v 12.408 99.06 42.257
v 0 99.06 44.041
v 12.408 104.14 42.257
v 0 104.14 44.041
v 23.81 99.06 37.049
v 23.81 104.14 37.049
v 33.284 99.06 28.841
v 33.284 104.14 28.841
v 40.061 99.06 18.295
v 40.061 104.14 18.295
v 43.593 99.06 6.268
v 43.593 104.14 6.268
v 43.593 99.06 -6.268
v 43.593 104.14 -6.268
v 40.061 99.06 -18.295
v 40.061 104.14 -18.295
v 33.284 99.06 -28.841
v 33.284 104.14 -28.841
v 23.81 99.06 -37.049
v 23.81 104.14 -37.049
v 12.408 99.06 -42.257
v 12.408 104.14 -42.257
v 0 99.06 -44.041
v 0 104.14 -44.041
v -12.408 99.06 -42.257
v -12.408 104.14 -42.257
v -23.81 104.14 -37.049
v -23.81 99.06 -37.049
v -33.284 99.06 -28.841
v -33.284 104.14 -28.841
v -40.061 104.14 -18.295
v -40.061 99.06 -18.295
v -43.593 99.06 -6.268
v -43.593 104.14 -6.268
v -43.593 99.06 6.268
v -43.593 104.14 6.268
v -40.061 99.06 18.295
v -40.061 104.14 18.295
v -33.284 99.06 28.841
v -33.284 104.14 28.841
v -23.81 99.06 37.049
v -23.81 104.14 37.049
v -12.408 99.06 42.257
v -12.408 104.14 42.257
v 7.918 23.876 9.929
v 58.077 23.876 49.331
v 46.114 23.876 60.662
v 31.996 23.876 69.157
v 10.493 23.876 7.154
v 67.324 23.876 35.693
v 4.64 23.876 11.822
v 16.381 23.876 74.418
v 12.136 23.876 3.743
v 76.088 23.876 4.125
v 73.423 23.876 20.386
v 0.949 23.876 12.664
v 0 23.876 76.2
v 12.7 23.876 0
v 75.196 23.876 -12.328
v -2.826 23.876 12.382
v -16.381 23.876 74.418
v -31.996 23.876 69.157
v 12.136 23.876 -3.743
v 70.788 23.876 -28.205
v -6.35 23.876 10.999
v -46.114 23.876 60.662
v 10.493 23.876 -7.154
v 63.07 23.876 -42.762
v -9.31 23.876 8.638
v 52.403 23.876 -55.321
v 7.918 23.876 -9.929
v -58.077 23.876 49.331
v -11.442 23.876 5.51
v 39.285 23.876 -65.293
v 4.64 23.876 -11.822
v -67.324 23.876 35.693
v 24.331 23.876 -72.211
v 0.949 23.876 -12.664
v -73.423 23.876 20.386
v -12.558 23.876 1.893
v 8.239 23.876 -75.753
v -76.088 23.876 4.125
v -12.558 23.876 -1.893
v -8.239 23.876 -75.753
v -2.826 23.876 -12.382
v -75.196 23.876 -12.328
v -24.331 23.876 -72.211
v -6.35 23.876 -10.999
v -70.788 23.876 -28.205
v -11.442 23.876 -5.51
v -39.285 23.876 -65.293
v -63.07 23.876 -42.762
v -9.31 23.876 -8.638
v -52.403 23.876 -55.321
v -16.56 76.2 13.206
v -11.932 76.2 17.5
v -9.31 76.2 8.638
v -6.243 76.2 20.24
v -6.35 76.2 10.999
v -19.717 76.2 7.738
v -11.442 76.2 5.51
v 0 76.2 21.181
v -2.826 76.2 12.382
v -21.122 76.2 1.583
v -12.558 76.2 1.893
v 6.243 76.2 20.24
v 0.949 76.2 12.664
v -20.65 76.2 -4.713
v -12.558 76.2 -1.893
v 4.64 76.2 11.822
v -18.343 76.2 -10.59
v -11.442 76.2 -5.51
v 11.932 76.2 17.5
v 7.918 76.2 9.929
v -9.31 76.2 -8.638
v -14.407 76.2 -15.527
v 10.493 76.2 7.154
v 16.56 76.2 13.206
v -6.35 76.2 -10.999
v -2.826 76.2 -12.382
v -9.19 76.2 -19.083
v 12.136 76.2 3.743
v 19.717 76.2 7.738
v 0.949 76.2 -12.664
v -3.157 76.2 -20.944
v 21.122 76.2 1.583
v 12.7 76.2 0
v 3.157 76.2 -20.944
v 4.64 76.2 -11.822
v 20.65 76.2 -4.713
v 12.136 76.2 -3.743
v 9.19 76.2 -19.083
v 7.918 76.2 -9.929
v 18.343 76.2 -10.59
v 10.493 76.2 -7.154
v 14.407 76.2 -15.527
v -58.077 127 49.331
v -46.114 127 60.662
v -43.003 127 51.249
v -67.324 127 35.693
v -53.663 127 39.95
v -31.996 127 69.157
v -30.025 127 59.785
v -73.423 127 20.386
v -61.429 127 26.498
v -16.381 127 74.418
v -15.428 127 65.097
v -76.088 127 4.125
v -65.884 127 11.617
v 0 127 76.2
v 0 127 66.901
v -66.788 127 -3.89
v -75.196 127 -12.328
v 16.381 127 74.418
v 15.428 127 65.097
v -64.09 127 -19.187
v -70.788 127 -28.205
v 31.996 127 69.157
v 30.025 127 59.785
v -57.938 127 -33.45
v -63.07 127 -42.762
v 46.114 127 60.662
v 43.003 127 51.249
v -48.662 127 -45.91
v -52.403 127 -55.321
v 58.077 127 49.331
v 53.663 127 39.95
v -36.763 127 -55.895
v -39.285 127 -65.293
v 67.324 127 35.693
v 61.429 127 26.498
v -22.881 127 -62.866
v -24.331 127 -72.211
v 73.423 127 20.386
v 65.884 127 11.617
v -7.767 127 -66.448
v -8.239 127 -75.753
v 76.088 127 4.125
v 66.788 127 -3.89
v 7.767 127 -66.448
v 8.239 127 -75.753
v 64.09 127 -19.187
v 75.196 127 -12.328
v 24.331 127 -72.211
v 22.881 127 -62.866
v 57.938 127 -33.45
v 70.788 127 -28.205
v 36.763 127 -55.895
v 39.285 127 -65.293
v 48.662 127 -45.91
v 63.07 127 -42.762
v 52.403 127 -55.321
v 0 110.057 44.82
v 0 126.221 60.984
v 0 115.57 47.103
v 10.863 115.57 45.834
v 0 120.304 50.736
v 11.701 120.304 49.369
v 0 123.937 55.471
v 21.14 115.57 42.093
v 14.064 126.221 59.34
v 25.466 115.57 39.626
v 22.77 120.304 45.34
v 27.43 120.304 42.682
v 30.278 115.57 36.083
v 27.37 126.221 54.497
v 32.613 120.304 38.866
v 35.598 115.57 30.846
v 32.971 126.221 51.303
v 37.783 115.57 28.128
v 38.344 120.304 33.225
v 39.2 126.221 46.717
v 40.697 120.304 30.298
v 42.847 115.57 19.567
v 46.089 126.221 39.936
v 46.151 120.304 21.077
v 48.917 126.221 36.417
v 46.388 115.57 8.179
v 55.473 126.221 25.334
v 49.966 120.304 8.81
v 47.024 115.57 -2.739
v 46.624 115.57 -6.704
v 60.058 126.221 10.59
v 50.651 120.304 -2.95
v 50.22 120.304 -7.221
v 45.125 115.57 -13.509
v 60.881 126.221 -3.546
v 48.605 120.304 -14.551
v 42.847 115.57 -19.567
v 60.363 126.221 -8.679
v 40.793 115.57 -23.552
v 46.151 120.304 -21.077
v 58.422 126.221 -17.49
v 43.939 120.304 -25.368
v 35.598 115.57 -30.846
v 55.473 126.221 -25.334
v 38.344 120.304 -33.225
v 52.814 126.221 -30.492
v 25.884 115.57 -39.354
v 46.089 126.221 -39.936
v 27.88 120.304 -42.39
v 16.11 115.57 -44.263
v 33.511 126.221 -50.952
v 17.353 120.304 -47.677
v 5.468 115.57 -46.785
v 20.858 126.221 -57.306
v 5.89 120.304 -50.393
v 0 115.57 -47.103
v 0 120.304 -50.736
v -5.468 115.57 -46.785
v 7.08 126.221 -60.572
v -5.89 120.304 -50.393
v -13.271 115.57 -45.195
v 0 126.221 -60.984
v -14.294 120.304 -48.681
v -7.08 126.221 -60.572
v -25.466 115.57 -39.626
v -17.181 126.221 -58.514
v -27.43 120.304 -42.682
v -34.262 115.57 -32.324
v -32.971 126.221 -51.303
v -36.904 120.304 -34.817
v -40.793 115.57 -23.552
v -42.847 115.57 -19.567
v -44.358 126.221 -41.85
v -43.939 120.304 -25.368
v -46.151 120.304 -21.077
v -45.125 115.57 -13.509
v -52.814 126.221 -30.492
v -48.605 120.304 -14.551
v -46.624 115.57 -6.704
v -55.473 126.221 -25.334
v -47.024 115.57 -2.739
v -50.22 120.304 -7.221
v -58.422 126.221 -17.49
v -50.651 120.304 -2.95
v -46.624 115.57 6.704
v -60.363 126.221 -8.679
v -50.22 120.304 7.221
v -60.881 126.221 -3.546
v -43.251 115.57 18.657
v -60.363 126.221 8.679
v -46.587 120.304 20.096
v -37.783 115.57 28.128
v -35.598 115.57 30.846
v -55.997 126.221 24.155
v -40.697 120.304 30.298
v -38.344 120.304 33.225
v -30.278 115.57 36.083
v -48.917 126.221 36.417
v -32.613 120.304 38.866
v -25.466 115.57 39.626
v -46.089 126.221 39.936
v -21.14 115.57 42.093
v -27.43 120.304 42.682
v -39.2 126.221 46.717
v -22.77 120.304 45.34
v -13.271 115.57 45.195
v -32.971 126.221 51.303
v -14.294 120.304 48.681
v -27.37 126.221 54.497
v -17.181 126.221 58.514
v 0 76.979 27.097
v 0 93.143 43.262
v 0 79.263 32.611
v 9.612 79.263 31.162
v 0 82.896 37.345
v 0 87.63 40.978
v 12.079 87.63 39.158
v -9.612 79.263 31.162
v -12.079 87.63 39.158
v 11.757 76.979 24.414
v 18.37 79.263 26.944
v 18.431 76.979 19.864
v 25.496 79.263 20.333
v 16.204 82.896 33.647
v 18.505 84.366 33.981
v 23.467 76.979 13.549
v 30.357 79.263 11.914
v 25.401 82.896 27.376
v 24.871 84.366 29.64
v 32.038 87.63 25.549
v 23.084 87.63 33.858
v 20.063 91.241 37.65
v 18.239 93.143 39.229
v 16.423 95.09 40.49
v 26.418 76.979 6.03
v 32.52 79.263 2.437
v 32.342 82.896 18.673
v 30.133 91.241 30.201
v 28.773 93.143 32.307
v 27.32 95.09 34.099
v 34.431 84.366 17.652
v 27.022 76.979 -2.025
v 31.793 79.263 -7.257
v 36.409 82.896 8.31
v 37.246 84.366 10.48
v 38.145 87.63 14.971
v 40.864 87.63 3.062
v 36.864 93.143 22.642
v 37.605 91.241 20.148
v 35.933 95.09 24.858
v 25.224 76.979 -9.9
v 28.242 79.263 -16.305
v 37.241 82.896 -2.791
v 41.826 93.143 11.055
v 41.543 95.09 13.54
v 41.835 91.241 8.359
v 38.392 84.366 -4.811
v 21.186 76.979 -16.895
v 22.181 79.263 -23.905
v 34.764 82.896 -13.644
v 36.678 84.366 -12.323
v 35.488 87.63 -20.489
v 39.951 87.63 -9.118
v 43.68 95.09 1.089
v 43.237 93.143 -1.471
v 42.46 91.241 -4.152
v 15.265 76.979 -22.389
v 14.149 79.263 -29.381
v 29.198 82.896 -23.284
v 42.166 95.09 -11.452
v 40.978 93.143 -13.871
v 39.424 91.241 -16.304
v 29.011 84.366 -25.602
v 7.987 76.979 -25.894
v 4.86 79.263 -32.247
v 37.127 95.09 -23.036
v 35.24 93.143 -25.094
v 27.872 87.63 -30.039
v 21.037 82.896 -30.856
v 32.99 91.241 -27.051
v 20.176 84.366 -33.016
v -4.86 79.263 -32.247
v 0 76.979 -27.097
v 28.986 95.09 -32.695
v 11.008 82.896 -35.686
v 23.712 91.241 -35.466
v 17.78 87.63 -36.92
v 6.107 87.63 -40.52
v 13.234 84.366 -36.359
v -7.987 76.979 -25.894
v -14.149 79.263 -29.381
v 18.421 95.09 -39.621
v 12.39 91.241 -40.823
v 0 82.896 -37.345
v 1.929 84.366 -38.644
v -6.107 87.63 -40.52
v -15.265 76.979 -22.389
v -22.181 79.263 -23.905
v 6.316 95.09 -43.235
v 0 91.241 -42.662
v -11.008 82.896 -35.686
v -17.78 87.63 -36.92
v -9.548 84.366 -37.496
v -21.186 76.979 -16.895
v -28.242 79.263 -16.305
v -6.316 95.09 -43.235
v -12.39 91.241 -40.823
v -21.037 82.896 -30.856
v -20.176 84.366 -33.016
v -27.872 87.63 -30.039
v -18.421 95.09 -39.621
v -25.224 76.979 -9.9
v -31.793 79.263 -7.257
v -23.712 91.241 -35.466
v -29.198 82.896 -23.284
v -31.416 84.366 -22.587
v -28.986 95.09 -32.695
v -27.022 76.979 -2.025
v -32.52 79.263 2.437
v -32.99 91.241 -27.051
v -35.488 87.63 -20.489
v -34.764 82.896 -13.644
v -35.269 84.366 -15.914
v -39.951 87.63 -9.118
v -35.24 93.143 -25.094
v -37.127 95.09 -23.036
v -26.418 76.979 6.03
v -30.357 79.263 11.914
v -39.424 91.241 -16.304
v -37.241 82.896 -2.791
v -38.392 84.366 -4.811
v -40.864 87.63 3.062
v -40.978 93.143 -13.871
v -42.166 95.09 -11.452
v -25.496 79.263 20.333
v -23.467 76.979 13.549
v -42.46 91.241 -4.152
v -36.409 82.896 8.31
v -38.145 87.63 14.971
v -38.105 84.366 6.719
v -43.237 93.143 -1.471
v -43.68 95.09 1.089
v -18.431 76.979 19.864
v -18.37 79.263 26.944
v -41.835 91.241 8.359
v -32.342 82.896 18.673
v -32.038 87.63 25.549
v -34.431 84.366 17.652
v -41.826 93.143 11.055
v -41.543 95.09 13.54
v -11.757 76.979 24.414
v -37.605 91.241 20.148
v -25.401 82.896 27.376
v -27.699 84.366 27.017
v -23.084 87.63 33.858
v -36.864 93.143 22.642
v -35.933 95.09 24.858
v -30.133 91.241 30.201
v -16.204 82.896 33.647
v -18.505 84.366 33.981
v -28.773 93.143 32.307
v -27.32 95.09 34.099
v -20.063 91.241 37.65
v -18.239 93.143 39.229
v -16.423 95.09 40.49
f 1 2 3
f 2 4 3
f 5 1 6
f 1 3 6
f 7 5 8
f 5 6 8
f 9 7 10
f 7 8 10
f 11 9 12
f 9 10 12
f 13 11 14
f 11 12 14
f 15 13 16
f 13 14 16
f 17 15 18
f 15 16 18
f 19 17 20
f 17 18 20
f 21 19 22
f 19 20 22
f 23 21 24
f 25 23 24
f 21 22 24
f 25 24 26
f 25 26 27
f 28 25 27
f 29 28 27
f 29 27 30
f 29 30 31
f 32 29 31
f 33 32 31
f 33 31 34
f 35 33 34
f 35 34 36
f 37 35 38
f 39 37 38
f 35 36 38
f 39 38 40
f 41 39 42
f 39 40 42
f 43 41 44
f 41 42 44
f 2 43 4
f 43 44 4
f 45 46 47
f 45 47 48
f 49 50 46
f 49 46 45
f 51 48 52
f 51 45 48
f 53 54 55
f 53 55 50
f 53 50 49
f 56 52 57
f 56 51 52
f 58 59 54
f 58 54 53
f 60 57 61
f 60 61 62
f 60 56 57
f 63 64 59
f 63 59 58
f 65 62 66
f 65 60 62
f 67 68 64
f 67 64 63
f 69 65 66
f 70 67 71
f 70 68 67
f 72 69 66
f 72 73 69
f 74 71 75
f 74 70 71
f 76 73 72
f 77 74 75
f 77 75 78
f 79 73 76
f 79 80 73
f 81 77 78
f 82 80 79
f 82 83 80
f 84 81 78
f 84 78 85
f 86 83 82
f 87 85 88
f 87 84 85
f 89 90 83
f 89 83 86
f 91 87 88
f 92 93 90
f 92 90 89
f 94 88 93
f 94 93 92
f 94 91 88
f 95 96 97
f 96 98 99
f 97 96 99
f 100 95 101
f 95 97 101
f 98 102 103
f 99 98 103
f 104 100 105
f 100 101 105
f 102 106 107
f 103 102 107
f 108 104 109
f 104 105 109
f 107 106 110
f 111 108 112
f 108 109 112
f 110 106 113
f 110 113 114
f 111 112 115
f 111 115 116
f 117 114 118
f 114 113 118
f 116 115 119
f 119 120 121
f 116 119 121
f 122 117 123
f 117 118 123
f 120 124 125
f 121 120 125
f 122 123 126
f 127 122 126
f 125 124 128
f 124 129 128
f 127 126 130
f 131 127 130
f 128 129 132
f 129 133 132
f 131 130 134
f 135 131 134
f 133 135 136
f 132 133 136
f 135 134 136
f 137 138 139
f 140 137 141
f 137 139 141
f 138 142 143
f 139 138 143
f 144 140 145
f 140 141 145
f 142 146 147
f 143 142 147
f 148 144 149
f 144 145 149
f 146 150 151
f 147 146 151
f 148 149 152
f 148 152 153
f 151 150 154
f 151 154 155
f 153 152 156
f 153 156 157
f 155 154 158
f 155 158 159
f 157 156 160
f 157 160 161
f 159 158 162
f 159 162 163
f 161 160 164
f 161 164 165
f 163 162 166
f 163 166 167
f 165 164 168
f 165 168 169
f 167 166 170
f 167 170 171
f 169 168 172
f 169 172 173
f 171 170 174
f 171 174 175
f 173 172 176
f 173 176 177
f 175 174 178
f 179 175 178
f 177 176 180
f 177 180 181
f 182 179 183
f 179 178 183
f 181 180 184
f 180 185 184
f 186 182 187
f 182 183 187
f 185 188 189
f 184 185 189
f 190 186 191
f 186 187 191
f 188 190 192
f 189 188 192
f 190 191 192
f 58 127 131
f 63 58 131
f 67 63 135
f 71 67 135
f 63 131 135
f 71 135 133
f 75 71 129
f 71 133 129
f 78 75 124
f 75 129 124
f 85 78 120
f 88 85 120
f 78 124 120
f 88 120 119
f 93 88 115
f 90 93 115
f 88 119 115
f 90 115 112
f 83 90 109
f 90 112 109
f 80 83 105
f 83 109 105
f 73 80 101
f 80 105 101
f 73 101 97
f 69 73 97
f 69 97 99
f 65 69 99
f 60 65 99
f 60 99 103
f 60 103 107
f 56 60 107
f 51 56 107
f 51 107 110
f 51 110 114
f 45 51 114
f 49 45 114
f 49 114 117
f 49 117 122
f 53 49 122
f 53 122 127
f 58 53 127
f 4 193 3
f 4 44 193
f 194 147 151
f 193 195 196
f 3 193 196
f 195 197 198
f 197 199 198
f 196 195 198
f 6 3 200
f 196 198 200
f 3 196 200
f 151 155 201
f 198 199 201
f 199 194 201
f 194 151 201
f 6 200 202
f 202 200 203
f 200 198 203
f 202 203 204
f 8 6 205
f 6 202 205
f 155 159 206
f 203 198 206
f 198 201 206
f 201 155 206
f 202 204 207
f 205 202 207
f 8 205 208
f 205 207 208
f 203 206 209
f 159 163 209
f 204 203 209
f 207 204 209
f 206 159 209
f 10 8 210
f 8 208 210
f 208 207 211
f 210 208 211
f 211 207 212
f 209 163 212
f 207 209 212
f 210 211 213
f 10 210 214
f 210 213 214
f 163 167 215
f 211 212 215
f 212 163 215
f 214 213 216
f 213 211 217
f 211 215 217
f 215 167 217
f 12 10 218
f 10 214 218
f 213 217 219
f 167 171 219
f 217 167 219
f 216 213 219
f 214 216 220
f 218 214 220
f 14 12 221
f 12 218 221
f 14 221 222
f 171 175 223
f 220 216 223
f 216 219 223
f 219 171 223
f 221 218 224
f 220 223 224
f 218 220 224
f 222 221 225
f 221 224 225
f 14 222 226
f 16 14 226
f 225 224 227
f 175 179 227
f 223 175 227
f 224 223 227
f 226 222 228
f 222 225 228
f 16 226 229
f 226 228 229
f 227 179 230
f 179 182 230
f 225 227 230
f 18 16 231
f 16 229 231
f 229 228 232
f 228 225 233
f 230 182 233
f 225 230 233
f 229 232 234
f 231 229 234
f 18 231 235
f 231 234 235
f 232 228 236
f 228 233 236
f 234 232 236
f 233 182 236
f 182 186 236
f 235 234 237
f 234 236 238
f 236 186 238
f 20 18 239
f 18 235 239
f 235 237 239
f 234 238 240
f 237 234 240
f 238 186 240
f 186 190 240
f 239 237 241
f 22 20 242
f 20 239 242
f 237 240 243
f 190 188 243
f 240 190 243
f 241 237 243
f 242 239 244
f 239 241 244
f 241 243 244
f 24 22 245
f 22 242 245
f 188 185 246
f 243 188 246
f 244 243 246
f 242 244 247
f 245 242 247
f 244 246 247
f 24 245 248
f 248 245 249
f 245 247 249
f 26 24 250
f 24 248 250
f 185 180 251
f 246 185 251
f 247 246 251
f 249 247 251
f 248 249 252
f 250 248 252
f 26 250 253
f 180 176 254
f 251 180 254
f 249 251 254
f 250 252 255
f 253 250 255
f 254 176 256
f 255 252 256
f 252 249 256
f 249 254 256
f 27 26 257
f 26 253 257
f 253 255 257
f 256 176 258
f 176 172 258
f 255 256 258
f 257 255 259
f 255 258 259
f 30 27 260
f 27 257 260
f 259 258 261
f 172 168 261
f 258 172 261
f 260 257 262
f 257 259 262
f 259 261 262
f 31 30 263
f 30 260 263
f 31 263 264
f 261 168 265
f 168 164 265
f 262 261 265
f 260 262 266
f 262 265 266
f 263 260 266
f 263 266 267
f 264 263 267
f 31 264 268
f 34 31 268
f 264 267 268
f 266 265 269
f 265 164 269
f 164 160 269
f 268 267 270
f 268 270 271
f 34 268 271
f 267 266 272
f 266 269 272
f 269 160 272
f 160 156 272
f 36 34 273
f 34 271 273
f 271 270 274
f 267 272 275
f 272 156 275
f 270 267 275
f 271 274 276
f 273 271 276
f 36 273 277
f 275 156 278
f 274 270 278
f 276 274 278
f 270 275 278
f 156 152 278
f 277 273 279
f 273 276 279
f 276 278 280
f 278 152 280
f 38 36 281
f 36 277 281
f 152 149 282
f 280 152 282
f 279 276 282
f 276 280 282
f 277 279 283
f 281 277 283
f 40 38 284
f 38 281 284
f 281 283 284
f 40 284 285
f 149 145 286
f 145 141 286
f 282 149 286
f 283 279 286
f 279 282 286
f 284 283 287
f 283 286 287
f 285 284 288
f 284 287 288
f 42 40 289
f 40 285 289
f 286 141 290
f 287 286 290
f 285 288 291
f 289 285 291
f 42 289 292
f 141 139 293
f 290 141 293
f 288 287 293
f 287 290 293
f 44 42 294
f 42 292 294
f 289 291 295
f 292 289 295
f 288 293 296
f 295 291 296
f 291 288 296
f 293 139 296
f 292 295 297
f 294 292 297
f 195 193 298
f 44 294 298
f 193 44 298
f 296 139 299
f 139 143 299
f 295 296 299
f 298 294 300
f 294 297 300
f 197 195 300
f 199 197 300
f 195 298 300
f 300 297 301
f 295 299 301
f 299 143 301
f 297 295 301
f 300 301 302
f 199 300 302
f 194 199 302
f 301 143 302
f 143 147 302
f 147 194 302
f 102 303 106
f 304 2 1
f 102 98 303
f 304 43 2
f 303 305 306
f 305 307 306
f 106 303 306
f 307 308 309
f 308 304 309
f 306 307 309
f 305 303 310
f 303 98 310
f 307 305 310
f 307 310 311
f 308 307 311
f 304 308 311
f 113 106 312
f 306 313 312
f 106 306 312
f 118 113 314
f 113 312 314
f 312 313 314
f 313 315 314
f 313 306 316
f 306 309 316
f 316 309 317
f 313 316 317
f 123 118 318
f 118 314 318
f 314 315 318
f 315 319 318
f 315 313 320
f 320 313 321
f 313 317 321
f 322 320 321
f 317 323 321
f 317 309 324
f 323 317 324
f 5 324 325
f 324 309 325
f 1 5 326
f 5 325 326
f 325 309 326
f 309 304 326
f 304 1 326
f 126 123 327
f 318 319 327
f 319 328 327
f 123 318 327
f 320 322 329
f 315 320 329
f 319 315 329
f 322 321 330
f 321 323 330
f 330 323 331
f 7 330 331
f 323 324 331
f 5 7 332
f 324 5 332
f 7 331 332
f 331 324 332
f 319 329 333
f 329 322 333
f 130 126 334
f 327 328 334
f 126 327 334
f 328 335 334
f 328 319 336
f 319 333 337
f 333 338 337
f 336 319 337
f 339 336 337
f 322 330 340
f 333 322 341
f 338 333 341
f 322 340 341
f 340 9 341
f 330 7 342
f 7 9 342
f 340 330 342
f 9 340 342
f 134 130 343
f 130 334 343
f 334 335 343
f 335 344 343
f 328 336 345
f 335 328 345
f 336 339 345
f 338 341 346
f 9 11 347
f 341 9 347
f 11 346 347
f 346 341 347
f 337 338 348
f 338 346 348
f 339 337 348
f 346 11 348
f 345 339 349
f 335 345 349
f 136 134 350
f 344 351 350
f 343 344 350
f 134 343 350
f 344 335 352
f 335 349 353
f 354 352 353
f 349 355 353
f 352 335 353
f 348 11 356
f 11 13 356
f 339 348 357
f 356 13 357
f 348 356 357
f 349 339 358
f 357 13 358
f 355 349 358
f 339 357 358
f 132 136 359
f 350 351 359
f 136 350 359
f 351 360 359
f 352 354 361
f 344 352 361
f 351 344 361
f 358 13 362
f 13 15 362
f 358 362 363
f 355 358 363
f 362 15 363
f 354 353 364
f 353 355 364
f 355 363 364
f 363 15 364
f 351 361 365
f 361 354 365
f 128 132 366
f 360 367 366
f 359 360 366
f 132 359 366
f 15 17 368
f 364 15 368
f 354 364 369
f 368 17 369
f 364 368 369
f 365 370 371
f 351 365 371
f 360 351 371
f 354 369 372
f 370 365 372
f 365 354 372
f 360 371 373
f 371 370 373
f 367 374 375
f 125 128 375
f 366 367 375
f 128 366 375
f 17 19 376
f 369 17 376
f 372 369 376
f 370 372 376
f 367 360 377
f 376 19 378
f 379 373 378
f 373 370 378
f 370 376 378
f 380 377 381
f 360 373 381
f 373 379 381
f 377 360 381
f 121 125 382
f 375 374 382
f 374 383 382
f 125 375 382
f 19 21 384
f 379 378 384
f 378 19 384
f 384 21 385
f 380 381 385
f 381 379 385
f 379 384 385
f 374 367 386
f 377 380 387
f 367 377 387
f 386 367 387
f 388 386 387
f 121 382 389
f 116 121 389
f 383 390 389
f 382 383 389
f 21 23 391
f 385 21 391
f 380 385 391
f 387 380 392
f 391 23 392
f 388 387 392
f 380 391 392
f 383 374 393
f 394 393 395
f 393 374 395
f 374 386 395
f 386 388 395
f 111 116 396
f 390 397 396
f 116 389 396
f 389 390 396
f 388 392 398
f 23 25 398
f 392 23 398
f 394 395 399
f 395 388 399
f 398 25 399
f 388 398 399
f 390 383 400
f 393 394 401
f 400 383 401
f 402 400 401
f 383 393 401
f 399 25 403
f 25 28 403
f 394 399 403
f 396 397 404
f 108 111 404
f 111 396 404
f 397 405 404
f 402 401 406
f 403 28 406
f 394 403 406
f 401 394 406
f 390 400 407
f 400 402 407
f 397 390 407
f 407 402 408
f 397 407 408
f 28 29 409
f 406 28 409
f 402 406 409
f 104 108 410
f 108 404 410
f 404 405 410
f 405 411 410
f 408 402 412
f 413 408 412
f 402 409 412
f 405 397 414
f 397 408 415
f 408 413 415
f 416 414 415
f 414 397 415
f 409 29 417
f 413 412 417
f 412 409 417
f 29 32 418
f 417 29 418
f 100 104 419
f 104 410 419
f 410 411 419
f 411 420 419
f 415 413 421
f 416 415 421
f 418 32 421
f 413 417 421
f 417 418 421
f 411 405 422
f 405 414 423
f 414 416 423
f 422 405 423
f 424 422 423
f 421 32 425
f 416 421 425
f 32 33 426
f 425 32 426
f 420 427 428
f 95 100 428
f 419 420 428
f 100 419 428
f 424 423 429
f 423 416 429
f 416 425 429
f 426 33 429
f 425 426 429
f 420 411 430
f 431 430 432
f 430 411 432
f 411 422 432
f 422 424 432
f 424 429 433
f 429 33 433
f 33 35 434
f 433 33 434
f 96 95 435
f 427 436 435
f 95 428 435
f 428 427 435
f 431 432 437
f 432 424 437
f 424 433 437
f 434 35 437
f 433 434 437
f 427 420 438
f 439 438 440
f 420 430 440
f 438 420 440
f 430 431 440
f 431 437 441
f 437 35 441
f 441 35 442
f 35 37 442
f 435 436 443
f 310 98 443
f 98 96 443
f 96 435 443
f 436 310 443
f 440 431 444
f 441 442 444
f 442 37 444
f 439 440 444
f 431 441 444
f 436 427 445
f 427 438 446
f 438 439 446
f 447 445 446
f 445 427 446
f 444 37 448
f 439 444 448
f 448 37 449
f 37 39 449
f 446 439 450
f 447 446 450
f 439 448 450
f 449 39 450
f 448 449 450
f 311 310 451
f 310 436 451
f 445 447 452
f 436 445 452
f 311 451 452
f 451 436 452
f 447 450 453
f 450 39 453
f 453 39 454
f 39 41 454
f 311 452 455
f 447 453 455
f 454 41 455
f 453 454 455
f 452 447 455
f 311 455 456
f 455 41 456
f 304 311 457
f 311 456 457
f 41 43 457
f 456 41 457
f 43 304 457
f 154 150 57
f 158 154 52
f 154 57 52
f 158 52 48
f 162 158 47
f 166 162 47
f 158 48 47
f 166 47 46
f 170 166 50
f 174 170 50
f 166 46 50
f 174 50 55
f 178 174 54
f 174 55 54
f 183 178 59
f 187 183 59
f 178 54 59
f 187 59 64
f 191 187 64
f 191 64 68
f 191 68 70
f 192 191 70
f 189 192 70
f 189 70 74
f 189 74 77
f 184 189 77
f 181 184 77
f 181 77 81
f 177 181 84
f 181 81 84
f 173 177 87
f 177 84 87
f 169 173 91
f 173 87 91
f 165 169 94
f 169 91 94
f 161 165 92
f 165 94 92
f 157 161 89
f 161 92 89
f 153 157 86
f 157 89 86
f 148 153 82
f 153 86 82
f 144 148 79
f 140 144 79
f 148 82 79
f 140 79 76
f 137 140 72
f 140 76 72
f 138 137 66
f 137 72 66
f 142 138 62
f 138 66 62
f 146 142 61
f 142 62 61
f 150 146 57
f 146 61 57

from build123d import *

# Parameters (mm, degrees)
SKETCH2_R          = 12.7
CUT_EXTRUDE1_DEPTH = 77.2
SKETCH3_R          = 76.2
CUT_EXTRUDE2_DEPTH = 23.876


with BuildPart() as part:
    # Sketch1 → Revolve1 (revolve)
    with BuildSketch(Plane(origin=(0, 0, 0), x_dir=(0, 0, -1), z_dir=(1, 0, 0))):
        with BuildLine():
            Line((0, 0), (0, 76.2))
            Line((0, 76.2), (-21.180812514, 76.2))
            ThreePointArc((-21.180812514, 76.2), (-37.345273532, 82.895538982), (-44.040812514, 99.06))
            Line((-44.040812514, 99.06), (-44.040812514, 104.14))
            ThreePointArc((-44.040812514, 104.14), (-50.736351496, 120.304461018), (-66.900812514, 127))
            Line((-66.900812514, 127), (-76.2, 127))
            Line((-76.2, 127), (-76.2, 0))
            Line((-76.2, 0), (0, 0))
        make_face()
    revolve(axis=Axis((0, 0, 0), (0, 1, 0)))

    # Sketch2 → Cut-Extrude1 (cut, through all)
    with BuildSketch(Plane(origin=(0, 76.2, 0), x_dir=(1, 0, 0), z_dir=(0, 1, 0))):
        Circle(SKETCH2_R)
    extrude(amount=-CUT_EXTRUDE1_DEPTH, mode=Mode.SUBTRACT)

    # Sketch3 → Cut-Extrude2 (cut)
    with BuildSketch(Plane(origin=(0, 0, 0), x_dir=(-1, 0, 0), z_dir=(0, -1, 0))):
        Circle(SKETCH3_R)
    extrude(amount=-CUT_EXTRUDE2_DEPTH, mode=Mode.SUBTRACT)


solid = part.part
